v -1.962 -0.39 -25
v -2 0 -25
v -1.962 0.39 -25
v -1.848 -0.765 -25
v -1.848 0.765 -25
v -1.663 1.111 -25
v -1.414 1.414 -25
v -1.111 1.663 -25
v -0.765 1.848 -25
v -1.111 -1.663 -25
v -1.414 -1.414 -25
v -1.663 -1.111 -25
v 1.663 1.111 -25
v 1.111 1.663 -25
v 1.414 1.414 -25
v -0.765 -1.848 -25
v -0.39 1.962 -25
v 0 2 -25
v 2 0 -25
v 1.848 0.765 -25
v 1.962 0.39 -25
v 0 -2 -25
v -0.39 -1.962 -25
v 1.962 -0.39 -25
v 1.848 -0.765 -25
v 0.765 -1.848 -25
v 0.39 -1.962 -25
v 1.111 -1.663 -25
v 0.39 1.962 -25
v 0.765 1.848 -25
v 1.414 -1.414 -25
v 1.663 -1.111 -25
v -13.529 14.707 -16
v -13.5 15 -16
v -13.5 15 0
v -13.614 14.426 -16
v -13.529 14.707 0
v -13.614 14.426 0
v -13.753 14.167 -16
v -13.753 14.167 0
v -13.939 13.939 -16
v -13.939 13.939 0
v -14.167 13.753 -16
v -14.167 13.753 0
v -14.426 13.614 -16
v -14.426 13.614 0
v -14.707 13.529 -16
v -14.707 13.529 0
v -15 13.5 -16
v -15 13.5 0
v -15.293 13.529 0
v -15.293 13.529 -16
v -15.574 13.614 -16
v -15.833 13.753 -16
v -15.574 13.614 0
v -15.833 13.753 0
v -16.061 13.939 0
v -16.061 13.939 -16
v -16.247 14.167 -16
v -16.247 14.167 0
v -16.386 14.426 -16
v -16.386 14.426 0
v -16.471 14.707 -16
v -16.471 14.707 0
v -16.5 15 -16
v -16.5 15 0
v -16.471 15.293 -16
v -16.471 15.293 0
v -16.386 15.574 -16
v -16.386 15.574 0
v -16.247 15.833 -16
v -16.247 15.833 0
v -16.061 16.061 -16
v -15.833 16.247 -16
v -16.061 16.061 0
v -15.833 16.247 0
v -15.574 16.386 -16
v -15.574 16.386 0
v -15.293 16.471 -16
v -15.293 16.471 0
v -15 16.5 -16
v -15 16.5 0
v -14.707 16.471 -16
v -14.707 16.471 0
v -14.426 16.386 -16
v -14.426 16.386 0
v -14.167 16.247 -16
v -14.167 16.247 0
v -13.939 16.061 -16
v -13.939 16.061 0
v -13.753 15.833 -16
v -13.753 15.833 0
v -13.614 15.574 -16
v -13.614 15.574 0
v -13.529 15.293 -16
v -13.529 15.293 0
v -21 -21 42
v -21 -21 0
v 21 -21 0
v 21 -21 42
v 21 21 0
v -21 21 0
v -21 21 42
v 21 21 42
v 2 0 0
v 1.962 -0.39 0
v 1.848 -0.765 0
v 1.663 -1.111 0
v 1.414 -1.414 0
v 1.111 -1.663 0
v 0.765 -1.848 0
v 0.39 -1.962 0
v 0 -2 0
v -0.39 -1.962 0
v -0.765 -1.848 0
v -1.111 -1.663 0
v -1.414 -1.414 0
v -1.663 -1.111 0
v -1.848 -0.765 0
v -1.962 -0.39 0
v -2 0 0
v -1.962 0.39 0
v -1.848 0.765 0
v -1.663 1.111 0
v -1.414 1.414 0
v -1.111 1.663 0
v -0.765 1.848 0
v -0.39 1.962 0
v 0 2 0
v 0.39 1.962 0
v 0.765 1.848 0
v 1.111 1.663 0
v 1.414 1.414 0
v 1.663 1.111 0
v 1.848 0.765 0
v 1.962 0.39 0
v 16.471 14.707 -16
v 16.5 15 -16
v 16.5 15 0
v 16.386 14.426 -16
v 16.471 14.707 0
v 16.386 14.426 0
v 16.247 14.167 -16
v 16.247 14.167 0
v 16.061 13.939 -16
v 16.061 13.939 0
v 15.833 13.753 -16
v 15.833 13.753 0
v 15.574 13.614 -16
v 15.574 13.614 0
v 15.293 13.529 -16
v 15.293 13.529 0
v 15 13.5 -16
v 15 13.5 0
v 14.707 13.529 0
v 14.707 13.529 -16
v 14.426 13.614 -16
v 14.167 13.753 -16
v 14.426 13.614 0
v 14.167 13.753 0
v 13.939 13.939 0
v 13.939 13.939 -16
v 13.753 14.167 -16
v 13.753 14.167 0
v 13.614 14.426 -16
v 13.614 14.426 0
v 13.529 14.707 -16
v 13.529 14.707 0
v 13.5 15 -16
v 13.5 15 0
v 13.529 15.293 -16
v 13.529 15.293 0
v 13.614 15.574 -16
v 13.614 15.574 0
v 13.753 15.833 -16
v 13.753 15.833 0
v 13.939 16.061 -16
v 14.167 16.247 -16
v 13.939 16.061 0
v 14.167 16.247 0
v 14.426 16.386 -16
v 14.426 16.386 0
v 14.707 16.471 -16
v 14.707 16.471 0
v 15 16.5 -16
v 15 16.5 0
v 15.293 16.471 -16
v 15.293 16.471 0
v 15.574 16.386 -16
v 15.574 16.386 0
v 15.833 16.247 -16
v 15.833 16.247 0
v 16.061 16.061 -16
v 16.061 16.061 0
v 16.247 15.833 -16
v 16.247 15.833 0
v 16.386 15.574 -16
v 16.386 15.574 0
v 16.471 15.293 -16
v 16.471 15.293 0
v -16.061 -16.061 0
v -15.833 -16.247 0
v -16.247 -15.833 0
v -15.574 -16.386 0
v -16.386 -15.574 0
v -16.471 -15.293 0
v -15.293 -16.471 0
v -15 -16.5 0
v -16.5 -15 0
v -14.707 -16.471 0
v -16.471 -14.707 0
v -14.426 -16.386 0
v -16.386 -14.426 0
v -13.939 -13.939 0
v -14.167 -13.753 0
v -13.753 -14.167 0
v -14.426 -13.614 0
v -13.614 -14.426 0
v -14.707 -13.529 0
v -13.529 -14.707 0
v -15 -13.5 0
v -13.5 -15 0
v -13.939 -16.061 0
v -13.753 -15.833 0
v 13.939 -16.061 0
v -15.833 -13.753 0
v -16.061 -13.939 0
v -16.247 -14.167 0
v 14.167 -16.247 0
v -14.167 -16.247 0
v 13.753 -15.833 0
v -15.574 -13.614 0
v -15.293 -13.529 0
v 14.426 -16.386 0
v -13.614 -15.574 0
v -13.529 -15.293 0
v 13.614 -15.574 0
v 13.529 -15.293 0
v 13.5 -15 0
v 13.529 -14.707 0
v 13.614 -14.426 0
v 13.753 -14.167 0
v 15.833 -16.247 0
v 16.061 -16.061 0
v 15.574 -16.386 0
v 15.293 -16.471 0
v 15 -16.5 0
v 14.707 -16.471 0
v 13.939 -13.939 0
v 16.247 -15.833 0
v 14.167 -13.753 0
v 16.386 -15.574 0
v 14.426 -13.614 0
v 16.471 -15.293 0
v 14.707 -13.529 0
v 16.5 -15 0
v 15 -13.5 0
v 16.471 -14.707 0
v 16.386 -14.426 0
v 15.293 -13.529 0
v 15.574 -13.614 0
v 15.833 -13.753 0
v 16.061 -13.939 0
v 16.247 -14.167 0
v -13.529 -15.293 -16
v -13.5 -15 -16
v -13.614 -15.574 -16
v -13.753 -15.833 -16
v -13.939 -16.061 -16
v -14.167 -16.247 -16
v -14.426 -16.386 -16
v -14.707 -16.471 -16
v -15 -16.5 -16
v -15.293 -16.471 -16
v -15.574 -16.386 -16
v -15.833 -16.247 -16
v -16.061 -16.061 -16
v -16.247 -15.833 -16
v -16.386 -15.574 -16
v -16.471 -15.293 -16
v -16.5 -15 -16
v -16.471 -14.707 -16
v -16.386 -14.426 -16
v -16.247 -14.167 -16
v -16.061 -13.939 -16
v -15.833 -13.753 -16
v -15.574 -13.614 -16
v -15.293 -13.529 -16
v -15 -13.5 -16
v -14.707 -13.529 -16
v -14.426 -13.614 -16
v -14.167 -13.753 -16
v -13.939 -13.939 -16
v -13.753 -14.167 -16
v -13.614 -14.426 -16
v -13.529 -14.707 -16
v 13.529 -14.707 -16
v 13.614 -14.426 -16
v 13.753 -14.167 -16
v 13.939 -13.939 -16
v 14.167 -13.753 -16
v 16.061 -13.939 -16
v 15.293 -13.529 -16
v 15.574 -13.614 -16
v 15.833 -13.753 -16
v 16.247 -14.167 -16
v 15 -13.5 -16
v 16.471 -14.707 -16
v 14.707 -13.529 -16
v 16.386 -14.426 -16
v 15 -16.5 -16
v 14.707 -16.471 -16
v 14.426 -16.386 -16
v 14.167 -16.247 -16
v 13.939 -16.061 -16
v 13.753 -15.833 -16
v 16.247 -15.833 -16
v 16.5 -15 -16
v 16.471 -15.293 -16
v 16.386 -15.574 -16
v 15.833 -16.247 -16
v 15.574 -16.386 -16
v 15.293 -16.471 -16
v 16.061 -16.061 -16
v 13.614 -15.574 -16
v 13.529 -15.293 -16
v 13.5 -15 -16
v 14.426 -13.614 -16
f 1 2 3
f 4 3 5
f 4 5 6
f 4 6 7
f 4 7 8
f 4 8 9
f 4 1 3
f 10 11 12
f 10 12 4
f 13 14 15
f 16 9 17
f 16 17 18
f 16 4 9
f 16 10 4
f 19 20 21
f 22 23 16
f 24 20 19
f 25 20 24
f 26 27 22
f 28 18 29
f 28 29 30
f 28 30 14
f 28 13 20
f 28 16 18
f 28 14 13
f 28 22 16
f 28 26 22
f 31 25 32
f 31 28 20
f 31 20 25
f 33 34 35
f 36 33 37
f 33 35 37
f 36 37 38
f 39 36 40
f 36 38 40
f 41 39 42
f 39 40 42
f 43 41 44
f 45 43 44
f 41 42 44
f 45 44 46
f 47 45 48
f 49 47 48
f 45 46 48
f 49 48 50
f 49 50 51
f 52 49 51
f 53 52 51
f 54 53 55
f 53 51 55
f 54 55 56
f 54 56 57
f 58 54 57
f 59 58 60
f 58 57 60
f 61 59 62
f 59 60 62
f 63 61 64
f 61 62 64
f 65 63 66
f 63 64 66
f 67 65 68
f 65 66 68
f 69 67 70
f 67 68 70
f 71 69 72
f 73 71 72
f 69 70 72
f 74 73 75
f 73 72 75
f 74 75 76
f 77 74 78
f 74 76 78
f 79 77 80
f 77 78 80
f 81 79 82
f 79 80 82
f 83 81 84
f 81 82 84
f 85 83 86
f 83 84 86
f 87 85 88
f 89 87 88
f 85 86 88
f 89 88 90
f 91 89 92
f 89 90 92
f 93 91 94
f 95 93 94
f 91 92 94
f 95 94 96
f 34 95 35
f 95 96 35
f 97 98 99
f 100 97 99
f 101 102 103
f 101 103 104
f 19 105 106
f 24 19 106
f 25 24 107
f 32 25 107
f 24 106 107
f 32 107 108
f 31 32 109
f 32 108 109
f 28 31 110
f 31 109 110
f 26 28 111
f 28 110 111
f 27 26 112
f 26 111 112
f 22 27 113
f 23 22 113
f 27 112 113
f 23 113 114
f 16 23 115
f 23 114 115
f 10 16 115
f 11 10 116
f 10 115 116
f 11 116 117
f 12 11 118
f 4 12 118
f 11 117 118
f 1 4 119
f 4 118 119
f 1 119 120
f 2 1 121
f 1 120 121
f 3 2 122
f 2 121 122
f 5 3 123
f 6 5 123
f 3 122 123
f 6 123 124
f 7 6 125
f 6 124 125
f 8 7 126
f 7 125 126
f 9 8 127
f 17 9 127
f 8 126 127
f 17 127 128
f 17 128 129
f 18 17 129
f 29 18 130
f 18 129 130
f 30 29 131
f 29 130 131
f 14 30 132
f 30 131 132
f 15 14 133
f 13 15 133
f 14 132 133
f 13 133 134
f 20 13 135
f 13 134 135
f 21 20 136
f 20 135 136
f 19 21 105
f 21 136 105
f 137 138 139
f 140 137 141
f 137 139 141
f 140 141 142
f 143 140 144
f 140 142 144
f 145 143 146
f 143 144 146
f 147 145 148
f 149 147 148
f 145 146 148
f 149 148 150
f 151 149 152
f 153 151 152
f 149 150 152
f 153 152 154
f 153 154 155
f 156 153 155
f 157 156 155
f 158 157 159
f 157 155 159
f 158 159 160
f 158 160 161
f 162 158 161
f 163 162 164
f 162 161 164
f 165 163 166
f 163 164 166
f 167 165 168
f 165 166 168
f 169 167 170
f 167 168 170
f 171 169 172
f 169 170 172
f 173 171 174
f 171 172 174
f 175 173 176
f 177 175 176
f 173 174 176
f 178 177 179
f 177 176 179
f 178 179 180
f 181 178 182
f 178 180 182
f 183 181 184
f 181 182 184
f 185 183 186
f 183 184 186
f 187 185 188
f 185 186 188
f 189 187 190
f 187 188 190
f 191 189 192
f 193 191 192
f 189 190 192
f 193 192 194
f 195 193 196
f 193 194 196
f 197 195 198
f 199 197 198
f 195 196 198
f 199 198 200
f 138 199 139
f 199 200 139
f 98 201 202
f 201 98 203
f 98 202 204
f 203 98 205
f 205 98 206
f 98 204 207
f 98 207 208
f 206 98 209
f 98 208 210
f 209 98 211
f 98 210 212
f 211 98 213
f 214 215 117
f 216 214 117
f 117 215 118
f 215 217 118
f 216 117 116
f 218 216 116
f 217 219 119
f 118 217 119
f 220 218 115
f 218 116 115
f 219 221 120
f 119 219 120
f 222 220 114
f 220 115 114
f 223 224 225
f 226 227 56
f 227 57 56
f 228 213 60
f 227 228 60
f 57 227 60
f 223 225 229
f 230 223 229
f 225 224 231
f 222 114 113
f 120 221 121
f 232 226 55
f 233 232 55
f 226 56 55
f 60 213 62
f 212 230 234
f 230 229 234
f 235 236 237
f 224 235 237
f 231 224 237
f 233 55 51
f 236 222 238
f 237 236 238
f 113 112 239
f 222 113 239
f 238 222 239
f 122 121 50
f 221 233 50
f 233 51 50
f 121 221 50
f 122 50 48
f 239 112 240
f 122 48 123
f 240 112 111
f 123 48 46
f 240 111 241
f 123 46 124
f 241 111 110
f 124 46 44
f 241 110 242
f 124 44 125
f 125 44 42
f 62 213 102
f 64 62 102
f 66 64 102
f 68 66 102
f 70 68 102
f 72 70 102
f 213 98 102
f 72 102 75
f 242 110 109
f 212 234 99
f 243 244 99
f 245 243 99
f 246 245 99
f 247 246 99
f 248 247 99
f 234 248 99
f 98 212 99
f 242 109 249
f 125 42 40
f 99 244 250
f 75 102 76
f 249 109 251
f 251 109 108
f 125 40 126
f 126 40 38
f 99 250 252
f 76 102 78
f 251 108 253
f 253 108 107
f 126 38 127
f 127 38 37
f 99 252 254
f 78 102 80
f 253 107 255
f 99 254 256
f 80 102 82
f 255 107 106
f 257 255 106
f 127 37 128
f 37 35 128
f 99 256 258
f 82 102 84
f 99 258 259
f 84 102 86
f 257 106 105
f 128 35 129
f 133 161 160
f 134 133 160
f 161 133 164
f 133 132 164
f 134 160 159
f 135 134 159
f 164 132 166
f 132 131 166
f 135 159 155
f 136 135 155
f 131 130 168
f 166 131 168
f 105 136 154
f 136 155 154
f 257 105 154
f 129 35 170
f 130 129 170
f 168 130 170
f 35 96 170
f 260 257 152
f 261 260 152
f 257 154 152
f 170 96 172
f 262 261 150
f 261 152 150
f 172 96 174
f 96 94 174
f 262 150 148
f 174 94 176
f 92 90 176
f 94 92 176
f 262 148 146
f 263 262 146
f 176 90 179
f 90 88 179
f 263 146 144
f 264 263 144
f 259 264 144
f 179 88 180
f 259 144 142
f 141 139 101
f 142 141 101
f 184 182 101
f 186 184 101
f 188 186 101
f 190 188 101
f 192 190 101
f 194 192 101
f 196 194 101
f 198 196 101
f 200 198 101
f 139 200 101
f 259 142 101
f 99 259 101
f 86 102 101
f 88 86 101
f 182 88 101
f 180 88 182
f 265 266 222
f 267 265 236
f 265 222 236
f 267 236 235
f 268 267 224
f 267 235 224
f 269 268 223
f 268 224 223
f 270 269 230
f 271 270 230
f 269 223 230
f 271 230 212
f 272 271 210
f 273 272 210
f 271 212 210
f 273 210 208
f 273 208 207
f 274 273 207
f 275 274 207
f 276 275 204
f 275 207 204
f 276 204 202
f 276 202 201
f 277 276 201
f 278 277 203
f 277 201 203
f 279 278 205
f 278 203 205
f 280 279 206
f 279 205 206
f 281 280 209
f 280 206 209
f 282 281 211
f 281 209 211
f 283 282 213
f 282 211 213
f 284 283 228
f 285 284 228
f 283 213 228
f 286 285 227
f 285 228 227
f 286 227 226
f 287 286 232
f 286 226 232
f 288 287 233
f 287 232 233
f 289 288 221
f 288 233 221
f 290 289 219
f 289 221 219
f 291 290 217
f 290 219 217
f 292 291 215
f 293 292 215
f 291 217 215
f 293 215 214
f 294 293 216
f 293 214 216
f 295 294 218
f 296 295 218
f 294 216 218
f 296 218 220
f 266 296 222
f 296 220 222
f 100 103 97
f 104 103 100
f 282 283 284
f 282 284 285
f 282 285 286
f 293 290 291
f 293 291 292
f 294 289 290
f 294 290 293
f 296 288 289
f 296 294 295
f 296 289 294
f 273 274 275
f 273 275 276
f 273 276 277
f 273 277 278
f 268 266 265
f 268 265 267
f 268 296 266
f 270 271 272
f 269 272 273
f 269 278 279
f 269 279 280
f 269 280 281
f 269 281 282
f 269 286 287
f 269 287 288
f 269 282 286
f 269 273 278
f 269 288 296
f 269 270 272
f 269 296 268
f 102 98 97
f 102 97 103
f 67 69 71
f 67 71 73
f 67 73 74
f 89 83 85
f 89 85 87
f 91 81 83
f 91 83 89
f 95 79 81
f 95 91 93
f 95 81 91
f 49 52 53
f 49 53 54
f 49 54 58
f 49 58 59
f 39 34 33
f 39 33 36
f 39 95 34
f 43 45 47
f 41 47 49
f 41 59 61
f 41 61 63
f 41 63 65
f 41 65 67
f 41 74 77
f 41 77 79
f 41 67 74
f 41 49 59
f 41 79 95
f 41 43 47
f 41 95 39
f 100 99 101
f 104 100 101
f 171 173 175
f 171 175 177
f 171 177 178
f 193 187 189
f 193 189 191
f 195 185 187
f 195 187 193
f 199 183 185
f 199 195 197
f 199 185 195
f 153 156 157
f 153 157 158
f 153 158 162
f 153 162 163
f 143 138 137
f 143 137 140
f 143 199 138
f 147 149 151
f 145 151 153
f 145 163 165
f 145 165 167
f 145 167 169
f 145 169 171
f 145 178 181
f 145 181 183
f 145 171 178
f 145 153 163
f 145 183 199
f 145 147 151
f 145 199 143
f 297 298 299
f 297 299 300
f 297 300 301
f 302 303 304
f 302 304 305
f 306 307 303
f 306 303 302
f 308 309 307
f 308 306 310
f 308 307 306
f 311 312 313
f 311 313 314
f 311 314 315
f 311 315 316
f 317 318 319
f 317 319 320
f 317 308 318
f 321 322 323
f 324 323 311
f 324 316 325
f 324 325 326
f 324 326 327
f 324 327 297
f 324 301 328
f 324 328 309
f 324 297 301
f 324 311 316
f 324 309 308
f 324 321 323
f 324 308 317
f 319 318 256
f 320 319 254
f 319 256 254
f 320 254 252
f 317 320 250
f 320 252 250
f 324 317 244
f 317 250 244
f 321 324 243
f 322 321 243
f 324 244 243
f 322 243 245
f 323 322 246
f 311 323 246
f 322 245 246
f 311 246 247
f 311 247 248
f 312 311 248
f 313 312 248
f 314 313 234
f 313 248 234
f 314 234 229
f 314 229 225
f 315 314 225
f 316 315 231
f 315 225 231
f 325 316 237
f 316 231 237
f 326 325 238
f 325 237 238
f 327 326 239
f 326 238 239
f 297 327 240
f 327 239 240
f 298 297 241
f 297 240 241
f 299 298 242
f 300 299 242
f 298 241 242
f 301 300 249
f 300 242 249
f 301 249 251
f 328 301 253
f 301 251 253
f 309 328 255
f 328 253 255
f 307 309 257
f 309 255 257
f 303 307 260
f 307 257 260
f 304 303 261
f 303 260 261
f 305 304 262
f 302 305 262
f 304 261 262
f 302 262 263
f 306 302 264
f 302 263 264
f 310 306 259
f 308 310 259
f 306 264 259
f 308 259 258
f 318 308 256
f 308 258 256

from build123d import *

# Parameters (mm, degrees)
F0_W     = 42
F0_H     = 42
F1_DEPTH = 42
F2_R     = 2
F3_DEPTH = 25
F4_R     = 1.5
F5_DEPTH = 16


with BuildPart() as f1:
    # F0 (on Top) → F1 (new body)
    with BuildSketch(Plane.XY):
        Rectangle(F0_W, F0_H)
    extrude(amount=F1_DEPTH)

    # F2 (on face) → F3 (join)
    with BuildSketch(Plane(origin=(0, 0, 0), x_dir=(1, 0, 0), z_dir=(0, 0, -1))):
        Circle(F2_R)
    extrude(amount=F3_DEPTH)

    # F4 (on face) → F5 (join)
    with BuildSketch(Plane(origin=(0, 0, 0), x_dir=(1, 0, 0), z_dir=(0, 0, -1))):
        with Locations((-15, 15)):
            Circle(F4_R)
        with Locations((15, 15)):
            Circle(F4_R)
        with Locations((15, -15)):
            Circle(F4_R)
        with Locations((-15, -15)):
            Circle(F4_R)
    extrude(amount=F5_DEPTH)


solid = f1.part
